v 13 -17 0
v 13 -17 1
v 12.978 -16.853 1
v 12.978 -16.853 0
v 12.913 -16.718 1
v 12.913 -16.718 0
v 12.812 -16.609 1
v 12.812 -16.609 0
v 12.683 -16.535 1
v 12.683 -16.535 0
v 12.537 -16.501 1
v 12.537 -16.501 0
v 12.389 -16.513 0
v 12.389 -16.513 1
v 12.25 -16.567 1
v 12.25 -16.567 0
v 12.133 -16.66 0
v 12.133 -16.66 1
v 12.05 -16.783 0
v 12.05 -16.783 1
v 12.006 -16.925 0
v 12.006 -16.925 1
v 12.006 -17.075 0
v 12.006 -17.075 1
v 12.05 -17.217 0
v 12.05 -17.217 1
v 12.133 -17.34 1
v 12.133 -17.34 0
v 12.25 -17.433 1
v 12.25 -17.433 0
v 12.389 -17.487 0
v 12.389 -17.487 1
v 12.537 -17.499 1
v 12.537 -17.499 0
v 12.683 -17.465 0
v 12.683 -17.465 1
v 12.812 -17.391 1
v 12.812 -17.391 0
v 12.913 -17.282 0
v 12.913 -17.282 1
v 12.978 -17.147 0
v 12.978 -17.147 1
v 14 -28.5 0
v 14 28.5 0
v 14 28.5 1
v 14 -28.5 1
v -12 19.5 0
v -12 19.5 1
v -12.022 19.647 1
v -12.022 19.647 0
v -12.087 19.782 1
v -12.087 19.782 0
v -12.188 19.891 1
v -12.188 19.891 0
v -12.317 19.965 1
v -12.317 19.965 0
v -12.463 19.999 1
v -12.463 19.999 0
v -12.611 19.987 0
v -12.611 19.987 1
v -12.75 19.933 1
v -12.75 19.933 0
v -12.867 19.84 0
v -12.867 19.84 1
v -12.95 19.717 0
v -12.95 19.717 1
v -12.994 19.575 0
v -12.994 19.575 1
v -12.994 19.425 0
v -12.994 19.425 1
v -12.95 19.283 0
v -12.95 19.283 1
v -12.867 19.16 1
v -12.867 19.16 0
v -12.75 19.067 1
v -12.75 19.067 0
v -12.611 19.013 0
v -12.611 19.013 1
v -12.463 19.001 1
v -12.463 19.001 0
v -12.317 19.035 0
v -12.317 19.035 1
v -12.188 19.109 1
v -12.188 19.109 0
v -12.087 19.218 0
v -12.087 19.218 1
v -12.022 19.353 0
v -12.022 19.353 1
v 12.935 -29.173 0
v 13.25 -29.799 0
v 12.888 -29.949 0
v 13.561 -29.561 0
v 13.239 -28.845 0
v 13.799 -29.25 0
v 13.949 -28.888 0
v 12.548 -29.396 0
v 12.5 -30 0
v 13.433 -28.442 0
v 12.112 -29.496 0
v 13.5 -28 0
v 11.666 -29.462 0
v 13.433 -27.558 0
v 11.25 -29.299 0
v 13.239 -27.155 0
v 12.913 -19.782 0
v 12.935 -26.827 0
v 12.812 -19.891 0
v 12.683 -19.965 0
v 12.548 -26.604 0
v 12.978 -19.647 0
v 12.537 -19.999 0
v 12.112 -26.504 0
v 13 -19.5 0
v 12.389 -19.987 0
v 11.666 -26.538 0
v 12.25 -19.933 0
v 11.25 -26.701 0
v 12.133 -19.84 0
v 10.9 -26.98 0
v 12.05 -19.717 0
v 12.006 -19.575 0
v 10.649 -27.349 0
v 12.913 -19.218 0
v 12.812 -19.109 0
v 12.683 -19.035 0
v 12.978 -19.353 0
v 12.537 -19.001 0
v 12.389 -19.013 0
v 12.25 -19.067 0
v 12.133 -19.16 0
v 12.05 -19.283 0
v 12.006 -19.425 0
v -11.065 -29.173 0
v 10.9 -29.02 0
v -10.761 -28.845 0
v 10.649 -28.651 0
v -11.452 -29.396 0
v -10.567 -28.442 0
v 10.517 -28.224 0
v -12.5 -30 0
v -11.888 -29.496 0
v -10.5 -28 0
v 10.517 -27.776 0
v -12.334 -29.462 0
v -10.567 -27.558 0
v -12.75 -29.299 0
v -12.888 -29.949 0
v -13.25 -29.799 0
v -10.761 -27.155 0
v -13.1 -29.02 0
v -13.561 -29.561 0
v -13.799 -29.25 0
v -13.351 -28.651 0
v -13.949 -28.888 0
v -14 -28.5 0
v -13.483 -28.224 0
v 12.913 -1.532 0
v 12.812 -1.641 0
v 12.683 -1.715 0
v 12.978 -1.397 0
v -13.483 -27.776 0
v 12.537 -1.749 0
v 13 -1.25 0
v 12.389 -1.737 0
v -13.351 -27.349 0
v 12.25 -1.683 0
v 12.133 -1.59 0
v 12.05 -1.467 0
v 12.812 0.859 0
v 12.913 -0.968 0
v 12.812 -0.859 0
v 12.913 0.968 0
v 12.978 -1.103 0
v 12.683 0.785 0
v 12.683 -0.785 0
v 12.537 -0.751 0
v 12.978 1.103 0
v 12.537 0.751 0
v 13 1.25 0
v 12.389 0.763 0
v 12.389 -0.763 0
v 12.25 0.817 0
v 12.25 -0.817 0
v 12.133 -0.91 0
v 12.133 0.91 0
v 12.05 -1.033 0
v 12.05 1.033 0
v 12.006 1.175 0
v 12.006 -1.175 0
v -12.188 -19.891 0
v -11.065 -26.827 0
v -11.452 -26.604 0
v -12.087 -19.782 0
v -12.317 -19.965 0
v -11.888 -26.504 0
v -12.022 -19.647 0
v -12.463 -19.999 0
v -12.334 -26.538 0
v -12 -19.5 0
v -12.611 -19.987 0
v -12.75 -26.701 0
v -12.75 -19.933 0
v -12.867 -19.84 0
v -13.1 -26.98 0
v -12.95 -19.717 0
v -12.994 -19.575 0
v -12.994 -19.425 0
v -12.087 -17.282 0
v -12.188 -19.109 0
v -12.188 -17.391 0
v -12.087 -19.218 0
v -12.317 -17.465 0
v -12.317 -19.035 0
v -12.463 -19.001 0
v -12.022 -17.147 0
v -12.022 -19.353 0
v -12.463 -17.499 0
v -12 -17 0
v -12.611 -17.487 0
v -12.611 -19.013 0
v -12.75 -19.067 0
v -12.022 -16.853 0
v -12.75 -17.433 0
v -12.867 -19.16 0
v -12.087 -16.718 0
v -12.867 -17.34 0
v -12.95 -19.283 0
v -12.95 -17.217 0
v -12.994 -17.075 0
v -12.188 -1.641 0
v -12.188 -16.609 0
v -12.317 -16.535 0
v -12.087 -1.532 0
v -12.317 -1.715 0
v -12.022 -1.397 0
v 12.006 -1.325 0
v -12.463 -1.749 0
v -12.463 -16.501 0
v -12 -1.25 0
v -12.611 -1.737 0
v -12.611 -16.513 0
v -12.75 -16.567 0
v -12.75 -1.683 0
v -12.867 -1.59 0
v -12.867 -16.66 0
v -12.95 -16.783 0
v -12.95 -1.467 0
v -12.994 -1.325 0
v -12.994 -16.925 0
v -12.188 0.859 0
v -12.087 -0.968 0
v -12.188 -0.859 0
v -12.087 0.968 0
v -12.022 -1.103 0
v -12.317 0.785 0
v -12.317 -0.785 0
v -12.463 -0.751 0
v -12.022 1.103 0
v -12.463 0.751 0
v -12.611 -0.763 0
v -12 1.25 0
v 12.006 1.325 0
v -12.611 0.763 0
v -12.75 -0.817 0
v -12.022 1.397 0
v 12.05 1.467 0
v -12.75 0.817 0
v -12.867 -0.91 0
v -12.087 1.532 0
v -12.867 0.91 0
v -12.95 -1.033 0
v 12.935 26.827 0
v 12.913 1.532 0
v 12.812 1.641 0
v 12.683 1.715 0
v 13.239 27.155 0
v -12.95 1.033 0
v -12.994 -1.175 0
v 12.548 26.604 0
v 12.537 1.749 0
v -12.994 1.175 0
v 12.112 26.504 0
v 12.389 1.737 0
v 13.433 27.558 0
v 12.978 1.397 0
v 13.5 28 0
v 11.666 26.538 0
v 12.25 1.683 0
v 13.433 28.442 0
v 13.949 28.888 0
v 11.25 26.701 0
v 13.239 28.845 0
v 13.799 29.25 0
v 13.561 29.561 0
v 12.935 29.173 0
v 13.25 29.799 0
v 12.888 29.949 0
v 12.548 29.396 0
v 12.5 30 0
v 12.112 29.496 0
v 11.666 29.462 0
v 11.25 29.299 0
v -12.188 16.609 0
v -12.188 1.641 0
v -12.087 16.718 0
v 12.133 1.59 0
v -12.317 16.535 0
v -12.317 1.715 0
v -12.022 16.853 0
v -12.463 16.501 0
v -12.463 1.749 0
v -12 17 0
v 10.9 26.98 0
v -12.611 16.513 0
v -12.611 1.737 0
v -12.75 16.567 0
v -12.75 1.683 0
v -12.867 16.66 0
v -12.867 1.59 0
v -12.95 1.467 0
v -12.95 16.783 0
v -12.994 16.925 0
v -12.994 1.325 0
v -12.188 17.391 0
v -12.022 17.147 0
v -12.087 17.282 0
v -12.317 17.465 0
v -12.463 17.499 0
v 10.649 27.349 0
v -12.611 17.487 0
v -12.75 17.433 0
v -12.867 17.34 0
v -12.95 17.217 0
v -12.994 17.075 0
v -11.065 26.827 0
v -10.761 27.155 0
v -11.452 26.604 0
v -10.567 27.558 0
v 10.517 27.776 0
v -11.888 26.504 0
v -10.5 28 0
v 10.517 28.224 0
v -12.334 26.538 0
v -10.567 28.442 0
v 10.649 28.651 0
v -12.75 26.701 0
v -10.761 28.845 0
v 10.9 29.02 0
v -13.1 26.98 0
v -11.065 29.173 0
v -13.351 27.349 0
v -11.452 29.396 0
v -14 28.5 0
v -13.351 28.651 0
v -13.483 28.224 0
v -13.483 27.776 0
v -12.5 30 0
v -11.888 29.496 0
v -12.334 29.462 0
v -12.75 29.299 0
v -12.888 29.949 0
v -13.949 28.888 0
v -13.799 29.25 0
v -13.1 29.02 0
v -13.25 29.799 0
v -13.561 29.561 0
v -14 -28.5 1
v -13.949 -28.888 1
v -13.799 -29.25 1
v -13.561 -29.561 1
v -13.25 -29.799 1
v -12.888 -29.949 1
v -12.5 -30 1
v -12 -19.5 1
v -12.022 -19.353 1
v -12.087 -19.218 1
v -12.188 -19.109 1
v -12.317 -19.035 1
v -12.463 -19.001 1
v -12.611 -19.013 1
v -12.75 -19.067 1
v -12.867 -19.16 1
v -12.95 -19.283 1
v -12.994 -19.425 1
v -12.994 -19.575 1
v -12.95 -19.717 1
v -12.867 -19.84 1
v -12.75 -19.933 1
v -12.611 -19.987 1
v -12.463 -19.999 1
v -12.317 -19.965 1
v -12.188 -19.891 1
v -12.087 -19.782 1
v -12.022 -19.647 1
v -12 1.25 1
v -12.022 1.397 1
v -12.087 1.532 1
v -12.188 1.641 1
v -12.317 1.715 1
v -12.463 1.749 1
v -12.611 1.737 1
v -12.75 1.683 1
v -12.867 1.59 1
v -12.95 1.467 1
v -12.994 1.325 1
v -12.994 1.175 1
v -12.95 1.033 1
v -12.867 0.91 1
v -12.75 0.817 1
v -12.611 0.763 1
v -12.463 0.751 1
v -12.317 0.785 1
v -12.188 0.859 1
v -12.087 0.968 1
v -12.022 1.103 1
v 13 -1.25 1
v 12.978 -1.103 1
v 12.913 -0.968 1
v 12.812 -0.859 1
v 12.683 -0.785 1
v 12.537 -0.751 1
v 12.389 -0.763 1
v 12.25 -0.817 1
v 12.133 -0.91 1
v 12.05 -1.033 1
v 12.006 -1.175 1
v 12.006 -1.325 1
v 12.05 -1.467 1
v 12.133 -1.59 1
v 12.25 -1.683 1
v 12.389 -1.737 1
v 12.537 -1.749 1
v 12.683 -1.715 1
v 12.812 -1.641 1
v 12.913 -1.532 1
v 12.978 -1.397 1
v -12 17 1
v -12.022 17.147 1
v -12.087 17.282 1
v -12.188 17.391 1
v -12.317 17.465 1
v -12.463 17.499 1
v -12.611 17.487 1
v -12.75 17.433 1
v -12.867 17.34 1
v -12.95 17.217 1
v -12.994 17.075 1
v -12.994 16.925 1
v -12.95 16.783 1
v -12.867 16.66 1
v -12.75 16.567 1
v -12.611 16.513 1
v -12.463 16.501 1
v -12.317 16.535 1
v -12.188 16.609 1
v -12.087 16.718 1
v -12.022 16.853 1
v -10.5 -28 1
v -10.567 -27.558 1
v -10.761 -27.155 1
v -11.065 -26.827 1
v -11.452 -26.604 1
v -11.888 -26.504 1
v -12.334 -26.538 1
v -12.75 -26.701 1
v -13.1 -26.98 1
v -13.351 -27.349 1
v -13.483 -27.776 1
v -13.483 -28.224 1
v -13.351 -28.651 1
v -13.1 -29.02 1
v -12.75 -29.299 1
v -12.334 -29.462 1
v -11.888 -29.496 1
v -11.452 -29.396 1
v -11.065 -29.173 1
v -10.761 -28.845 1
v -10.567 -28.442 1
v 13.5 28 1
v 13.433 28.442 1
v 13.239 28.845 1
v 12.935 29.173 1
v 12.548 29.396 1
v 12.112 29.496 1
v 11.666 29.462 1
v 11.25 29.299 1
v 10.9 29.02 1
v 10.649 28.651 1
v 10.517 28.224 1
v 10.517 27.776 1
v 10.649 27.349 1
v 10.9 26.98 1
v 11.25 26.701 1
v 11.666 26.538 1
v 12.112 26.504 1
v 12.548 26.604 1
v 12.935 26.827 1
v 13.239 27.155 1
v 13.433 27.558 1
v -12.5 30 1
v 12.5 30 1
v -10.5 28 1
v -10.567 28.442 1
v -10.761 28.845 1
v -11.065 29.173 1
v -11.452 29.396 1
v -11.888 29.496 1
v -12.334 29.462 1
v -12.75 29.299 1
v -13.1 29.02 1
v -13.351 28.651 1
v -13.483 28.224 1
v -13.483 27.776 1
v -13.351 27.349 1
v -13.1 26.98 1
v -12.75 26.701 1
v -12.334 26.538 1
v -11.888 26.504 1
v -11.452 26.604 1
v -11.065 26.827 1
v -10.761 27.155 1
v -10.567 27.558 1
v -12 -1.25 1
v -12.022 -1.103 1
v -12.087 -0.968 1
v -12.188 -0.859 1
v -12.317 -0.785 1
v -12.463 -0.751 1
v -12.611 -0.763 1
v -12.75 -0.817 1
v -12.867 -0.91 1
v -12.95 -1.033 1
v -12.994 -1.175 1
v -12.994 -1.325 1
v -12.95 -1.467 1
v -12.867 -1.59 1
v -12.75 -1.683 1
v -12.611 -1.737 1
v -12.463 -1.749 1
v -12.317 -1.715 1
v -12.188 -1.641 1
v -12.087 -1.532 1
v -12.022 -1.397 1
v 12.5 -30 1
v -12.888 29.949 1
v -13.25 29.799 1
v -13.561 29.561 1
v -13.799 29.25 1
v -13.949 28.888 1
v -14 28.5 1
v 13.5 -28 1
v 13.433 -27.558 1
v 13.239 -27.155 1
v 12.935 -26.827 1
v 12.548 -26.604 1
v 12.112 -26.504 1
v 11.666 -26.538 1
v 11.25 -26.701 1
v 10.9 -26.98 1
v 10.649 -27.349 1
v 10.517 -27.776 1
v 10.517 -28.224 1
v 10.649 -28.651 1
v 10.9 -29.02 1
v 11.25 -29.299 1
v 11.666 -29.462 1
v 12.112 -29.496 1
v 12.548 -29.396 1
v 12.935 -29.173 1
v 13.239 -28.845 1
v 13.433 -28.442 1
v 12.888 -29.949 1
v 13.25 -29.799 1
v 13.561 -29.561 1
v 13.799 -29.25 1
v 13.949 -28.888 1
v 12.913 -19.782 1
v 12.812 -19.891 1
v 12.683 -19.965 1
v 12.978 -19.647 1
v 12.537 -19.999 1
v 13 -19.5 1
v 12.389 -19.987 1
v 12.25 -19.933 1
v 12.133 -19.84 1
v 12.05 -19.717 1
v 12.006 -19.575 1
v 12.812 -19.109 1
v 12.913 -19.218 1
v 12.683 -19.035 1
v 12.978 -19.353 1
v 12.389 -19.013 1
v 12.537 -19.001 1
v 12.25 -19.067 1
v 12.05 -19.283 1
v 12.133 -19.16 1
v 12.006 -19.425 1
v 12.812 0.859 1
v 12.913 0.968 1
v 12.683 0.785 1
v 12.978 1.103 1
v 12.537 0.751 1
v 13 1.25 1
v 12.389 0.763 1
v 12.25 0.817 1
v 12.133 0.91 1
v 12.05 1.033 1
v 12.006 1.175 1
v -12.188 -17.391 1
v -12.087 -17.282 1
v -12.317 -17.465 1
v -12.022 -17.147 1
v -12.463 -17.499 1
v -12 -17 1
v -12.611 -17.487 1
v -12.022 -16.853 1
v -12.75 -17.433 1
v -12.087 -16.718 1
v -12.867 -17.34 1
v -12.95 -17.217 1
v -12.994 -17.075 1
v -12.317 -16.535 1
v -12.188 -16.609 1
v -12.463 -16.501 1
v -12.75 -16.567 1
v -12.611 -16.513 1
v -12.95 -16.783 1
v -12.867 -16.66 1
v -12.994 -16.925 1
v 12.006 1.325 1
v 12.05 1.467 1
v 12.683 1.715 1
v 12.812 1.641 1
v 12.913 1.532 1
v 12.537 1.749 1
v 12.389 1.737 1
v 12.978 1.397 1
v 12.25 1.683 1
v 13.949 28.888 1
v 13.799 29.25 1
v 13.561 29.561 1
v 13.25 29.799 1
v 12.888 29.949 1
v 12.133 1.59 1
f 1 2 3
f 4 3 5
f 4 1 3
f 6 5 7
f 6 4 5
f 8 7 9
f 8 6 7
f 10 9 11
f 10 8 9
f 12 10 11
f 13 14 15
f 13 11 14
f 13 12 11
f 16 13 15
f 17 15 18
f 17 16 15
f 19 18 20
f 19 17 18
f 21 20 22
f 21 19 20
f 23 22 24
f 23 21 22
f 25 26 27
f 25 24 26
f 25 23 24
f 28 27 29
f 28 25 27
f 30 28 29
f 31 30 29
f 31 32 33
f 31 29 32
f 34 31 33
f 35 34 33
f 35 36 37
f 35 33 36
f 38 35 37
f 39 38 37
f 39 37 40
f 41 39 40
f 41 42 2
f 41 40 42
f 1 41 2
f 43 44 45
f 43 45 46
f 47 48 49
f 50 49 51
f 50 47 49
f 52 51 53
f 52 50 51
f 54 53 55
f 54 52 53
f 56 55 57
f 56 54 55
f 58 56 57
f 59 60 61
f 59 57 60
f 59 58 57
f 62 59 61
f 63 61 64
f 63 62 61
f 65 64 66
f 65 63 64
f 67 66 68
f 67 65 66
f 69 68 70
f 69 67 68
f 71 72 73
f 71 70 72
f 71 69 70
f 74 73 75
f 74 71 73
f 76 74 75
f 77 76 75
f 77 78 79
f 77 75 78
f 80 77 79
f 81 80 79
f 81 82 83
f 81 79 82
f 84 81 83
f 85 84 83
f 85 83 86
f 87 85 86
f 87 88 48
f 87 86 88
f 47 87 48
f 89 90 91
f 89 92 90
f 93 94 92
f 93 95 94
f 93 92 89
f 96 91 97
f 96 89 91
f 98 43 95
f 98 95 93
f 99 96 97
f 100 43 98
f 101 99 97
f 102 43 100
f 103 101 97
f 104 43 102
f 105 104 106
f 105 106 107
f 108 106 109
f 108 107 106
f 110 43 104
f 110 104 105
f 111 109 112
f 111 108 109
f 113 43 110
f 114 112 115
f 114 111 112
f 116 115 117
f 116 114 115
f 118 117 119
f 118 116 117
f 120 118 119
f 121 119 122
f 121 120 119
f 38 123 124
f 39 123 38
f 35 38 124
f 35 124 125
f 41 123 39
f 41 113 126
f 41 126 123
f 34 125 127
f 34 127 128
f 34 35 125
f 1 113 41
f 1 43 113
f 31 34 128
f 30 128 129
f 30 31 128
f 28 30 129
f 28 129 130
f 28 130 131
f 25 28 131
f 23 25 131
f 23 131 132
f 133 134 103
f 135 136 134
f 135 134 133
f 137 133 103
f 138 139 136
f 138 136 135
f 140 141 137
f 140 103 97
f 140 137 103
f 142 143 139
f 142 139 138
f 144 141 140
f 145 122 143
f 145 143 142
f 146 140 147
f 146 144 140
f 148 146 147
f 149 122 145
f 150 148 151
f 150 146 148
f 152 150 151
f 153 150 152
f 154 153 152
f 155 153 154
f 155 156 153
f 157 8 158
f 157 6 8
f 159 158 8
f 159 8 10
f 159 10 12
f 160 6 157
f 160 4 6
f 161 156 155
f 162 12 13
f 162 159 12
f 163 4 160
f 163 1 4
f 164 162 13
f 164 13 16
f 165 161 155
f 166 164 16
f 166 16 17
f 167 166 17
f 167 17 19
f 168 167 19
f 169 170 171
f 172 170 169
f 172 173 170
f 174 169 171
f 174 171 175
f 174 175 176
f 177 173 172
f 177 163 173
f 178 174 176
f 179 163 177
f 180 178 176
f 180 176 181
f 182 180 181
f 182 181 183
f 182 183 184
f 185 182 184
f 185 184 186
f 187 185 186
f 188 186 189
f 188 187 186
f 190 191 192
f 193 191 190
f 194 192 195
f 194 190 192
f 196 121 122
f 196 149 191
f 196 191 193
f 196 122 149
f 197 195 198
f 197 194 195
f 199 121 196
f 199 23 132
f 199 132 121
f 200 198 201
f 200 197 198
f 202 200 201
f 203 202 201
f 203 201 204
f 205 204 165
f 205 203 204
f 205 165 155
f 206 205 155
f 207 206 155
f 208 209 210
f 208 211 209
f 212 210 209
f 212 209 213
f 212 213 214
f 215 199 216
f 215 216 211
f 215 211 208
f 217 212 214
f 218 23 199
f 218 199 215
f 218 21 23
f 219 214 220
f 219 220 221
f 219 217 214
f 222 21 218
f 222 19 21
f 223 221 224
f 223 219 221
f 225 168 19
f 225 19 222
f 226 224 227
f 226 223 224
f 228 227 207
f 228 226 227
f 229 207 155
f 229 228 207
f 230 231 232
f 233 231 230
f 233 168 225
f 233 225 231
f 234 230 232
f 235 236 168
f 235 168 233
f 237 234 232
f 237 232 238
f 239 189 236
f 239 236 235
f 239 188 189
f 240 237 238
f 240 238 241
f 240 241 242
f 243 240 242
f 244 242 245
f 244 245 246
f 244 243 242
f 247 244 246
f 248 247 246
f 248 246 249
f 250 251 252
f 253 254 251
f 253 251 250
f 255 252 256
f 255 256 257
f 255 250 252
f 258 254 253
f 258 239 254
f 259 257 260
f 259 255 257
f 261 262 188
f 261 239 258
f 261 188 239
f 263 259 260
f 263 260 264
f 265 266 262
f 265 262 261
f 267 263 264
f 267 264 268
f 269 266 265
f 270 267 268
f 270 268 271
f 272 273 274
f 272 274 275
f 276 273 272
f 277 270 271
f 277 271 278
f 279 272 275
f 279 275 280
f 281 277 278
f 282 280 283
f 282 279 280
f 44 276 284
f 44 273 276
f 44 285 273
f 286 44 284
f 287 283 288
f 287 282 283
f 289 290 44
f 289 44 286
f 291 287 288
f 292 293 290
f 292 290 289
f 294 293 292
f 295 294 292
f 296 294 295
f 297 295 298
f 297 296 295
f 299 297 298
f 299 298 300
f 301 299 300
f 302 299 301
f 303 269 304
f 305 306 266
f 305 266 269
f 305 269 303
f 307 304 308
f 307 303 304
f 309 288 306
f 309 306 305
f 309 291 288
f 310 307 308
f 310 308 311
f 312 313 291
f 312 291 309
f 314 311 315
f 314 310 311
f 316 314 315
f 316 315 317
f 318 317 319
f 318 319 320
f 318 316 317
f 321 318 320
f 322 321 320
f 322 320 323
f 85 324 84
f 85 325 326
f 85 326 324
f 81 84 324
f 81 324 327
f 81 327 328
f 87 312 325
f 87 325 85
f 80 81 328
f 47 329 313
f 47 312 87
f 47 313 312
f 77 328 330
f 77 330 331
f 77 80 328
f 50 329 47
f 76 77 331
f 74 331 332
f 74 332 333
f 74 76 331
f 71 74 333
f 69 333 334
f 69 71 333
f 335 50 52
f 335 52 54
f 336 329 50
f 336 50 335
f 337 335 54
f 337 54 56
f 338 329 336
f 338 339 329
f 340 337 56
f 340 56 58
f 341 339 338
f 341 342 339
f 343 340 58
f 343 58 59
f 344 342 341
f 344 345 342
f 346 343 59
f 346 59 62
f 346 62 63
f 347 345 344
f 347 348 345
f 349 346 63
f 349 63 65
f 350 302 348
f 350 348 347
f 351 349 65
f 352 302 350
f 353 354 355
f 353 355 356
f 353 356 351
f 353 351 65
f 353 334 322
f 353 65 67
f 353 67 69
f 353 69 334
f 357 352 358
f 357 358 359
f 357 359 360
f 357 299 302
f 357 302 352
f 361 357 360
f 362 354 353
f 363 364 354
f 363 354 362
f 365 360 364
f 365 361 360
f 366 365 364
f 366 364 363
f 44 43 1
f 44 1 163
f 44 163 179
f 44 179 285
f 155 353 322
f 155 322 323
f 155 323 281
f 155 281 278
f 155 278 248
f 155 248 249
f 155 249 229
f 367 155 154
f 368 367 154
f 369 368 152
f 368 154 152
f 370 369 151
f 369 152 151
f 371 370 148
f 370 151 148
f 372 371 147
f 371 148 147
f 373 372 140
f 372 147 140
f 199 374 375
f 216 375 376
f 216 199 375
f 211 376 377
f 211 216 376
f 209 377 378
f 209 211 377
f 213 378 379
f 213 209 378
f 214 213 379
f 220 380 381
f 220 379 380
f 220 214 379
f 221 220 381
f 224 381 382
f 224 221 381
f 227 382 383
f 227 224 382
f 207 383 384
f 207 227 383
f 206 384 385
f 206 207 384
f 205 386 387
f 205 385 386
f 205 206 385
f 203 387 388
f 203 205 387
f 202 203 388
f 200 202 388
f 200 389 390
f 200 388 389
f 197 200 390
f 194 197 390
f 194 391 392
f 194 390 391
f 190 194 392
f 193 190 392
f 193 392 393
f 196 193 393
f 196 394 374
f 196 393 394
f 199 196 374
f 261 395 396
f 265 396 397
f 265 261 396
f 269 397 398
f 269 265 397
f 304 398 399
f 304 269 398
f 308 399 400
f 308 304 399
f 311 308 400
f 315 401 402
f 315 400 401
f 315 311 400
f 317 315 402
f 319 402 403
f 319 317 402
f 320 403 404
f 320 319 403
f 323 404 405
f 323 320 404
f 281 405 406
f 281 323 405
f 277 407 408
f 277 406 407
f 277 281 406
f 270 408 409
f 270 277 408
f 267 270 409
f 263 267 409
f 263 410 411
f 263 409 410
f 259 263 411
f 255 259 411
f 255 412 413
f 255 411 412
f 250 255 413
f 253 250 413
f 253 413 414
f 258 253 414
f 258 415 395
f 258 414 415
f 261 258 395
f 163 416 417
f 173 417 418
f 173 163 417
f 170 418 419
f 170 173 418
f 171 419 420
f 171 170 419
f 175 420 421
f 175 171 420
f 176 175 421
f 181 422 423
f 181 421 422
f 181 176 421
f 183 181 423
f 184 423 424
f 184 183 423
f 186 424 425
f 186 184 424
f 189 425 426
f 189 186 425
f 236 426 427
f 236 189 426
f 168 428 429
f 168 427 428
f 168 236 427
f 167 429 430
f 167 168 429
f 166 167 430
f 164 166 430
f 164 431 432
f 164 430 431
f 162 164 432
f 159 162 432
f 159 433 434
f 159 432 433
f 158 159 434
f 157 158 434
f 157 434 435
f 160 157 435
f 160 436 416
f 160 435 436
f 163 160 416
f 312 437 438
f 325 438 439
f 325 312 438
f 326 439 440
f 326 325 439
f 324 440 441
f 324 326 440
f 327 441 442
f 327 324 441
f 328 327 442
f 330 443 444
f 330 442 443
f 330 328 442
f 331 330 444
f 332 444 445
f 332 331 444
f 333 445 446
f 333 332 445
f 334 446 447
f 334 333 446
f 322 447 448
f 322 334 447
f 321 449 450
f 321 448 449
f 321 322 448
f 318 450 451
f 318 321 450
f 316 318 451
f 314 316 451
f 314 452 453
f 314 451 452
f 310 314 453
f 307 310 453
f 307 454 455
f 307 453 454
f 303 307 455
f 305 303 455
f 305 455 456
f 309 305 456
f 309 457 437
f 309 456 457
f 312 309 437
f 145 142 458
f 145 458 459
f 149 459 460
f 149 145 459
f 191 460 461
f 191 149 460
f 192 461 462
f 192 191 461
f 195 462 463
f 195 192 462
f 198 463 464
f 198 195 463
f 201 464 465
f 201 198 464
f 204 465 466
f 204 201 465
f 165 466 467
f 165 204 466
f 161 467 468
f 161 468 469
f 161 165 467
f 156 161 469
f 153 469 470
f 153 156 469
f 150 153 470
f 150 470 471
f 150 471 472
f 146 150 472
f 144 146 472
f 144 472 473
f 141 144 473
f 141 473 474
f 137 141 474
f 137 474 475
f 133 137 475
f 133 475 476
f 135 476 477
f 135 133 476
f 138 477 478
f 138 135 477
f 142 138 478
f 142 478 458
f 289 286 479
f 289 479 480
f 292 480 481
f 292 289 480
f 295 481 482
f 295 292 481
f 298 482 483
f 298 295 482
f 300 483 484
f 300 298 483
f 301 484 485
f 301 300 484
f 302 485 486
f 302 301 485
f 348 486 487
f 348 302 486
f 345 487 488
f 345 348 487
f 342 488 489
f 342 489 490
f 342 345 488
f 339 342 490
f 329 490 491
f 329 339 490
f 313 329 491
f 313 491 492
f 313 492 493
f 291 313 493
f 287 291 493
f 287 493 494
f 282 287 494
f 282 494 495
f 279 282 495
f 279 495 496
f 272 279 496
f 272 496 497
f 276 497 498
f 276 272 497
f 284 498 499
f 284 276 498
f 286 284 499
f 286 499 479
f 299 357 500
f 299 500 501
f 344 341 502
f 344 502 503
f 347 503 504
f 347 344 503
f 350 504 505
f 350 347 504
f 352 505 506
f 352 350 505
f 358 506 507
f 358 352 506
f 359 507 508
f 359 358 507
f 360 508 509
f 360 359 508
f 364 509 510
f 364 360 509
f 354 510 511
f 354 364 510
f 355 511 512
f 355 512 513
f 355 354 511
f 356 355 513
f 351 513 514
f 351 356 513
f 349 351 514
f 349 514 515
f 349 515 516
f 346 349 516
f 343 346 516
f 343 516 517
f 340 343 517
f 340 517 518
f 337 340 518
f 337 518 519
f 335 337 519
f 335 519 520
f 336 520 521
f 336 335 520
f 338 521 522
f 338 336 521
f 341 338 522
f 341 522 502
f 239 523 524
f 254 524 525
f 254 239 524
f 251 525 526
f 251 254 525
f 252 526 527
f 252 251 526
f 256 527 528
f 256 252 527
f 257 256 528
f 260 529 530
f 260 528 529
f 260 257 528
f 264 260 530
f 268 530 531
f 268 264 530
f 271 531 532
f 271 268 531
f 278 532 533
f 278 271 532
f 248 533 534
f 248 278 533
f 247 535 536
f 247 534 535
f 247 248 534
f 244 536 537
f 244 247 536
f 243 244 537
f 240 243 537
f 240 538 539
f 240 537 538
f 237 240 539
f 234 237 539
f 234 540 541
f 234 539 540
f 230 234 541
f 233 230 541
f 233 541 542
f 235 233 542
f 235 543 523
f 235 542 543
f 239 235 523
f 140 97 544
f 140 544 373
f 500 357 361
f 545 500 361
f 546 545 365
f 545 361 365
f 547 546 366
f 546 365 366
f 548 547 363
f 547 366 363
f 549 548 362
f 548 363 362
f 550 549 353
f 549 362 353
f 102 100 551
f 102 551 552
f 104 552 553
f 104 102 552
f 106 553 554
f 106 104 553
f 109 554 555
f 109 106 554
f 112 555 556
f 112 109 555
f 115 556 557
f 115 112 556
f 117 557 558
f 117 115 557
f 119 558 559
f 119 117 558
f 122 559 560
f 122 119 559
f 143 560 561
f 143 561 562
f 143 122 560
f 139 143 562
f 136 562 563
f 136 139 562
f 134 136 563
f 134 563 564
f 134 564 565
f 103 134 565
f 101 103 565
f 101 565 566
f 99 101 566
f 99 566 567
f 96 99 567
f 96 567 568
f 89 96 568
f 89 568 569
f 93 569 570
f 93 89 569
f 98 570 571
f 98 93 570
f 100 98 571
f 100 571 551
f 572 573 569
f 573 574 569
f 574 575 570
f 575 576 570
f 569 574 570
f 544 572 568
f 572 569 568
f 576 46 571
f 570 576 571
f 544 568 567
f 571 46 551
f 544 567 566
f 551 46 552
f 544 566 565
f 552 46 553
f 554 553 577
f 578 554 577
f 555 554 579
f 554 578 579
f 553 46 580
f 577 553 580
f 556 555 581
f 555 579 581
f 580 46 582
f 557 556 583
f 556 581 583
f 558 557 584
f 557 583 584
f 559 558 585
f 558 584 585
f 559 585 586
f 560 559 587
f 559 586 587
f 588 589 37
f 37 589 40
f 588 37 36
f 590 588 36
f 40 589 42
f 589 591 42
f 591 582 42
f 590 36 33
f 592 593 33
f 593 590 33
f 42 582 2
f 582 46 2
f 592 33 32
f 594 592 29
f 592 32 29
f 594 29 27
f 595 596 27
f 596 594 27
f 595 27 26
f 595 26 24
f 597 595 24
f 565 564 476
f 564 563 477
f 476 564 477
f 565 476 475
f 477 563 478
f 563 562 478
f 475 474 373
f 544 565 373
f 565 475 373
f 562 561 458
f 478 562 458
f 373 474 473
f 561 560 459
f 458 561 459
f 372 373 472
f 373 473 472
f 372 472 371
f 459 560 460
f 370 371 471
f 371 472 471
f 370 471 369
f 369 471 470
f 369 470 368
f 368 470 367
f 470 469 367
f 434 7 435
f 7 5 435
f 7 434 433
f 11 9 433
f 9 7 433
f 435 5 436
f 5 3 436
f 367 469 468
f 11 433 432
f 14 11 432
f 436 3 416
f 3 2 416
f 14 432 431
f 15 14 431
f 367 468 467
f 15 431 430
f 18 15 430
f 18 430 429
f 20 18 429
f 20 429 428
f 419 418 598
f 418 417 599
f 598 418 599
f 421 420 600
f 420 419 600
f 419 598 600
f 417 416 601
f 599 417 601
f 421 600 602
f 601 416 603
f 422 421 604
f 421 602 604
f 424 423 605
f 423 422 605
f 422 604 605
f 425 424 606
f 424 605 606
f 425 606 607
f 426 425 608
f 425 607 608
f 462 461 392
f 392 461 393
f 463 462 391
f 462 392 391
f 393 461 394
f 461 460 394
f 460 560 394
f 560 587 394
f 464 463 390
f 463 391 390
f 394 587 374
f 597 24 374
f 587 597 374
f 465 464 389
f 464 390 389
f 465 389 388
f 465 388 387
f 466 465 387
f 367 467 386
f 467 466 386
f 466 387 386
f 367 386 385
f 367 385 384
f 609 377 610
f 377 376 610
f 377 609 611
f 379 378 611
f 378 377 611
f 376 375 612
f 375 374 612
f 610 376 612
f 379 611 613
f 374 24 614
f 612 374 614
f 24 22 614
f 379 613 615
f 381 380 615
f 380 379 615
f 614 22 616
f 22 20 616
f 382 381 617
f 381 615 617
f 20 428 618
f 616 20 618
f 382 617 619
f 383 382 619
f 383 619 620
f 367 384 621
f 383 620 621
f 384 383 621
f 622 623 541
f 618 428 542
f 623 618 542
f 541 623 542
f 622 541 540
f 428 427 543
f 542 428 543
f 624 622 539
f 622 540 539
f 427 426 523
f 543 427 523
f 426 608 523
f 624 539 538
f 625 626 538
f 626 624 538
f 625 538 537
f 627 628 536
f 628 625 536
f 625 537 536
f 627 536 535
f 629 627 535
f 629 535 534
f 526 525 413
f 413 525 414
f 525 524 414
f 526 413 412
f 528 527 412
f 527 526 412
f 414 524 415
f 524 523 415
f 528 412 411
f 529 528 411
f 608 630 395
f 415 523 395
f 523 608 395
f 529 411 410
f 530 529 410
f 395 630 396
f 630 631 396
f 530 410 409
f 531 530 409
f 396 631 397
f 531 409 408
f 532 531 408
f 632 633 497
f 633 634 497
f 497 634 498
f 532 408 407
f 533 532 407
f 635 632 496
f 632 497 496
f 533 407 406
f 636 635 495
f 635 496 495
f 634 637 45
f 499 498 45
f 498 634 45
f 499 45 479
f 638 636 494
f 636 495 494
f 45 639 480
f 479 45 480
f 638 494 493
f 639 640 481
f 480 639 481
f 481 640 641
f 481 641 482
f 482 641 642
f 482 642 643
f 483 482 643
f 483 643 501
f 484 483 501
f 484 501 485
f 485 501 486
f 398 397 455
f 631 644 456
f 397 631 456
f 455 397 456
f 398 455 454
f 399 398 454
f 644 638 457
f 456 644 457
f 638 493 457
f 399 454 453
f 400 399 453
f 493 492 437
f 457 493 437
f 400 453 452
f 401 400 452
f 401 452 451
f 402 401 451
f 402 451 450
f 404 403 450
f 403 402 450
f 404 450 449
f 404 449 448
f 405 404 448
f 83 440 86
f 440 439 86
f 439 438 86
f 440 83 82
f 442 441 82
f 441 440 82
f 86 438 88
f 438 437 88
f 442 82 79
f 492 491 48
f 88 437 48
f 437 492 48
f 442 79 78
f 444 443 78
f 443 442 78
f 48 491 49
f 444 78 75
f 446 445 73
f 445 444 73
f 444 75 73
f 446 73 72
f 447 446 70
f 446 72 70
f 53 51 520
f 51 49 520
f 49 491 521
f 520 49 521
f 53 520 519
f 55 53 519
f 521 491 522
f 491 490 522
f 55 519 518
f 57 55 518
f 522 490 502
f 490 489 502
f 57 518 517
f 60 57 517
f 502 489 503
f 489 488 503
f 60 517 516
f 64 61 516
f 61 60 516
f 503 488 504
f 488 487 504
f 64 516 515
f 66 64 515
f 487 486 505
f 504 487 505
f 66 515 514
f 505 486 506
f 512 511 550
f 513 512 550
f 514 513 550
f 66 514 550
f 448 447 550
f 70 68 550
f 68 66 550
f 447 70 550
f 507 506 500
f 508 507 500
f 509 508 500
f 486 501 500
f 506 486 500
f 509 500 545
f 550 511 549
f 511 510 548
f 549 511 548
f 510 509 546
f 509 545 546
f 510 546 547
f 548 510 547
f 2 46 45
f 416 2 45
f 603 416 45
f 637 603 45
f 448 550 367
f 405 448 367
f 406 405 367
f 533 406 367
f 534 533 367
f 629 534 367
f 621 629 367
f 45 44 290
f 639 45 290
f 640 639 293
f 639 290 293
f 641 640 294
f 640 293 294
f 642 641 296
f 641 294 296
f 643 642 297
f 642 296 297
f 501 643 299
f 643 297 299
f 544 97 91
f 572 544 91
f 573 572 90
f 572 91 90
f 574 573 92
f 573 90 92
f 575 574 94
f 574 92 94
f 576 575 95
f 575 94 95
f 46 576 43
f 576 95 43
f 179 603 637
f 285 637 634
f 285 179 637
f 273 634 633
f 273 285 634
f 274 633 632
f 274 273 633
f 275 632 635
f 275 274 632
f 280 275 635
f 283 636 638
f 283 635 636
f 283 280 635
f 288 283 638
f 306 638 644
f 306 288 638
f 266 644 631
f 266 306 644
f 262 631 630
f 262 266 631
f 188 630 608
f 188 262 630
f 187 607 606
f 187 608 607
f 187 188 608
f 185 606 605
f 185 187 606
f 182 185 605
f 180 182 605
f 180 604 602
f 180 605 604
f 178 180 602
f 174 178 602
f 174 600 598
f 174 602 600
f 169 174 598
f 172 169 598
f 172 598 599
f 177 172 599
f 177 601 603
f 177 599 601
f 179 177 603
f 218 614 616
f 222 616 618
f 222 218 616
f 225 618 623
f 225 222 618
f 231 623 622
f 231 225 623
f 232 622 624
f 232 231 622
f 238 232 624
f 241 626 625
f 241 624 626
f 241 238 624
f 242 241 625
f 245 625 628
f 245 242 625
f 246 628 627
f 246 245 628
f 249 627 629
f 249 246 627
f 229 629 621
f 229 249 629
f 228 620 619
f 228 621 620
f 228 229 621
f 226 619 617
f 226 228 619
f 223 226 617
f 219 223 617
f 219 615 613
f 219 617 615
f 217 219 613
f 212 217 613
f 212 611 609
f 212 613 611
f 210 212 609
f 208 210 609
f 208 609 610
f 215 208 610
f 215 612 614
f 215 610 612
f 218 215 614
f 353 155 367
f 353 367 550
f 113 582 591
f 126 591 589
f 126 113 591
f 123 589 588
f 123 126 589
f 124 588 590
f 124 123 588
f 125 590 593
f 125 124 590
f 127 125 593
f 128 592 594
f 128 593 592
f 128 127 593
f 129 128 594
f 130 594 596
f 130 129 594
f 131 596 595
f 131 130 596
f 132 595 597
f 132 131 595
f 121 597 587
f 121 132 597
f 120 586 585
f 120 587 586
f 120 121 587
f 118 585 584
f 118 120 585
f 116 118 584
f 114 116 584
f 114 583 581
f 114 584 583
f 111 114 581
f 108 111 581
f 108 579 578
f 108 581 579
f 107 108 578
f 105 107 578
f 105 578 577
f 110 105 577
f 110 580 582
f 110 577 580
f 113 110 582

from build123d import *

# Parameters (mm, degrees)
SKETCH_R     = 1.5
PAD_DEPTH    = 1
SKETCH001_R  = 0.5
POCKET_DEPTH = 1.001


with BuildPart() as part:
    # Sketch → Pad (new body)
    with BuildSketch(Plane.XY):
        with BuildLine():
            Line((-12.5, 30), (12.5, 30))
            ThreePointArc((14, 28.5), (13.56066, 29.56066), (12.5, 30))
            Line((14, 28.5), (14, -28.5))
            ThreePointArc((12.5, -30), (13.56066, -29.56066), (14, -28.5))
            Line((12.5, -30), (-12.5, -30))
            ThreePointArc((-14, -28.5), (-13.56066, -29.56066), (-12.5, -30))
            Line((-14, -28.5), (-14, 28.5))
            ThreePointArc((-12.5, 30), (-13.56066, 29.56066), (-14, 28.5))
        make_face()
        with Locations((-12, 28)):
            Circle(SKETCH_R, mode=Mode.SUBTRACT)
        with Locations((12, 28)):
            Circle(SKETCH_R, mode=Mode.SUBTRACT)
        with Locations((-12, -28)):
            Circle(SKETCH_R, mode=Mode.SUBTRACT)
        with Locations((12, -28)):
            Circle(SKETCH_R, mode=Mode.SUBTRACT)
    extrude(amount=PAD_DEPTH)

    # Sketch001 → Pocket (cut, through all)
    with BuildSketch(Plane.XY):
        with Locations((-12.5, 19.5)):
            Circle(SKETCH001_R)
        with Locations((-12.5, 17)):
            Circle(SKETCH001_R)
        with Locations((-12.5, 1.25)):
            Circle(SKETCH001_R)
        with Locations((-12.5, -1.25)):
            Circle(SKETCH001_R)
        with Locations((-12.5, -17)):
            Circle(SKETCH001_R)
        with Locations((-12.5, -19.5)):
            Circle(SKETCH001_R)
        with Locations((12.5, -17)):
            Circle(SKETCH001_R)
        with Locations((12.5, -19.5)):
            Circle(SKETCH001_R)
        with Locations((12.5, 1.25)):
            Circle(SKETCH001_R)
        with Locations((12.5, -1.25)):
            Circle(SKETCH001_R)
    extrude(amount=POCKET_DEPTH, mode=Mode.SUBTRACT)


solid = part.part
